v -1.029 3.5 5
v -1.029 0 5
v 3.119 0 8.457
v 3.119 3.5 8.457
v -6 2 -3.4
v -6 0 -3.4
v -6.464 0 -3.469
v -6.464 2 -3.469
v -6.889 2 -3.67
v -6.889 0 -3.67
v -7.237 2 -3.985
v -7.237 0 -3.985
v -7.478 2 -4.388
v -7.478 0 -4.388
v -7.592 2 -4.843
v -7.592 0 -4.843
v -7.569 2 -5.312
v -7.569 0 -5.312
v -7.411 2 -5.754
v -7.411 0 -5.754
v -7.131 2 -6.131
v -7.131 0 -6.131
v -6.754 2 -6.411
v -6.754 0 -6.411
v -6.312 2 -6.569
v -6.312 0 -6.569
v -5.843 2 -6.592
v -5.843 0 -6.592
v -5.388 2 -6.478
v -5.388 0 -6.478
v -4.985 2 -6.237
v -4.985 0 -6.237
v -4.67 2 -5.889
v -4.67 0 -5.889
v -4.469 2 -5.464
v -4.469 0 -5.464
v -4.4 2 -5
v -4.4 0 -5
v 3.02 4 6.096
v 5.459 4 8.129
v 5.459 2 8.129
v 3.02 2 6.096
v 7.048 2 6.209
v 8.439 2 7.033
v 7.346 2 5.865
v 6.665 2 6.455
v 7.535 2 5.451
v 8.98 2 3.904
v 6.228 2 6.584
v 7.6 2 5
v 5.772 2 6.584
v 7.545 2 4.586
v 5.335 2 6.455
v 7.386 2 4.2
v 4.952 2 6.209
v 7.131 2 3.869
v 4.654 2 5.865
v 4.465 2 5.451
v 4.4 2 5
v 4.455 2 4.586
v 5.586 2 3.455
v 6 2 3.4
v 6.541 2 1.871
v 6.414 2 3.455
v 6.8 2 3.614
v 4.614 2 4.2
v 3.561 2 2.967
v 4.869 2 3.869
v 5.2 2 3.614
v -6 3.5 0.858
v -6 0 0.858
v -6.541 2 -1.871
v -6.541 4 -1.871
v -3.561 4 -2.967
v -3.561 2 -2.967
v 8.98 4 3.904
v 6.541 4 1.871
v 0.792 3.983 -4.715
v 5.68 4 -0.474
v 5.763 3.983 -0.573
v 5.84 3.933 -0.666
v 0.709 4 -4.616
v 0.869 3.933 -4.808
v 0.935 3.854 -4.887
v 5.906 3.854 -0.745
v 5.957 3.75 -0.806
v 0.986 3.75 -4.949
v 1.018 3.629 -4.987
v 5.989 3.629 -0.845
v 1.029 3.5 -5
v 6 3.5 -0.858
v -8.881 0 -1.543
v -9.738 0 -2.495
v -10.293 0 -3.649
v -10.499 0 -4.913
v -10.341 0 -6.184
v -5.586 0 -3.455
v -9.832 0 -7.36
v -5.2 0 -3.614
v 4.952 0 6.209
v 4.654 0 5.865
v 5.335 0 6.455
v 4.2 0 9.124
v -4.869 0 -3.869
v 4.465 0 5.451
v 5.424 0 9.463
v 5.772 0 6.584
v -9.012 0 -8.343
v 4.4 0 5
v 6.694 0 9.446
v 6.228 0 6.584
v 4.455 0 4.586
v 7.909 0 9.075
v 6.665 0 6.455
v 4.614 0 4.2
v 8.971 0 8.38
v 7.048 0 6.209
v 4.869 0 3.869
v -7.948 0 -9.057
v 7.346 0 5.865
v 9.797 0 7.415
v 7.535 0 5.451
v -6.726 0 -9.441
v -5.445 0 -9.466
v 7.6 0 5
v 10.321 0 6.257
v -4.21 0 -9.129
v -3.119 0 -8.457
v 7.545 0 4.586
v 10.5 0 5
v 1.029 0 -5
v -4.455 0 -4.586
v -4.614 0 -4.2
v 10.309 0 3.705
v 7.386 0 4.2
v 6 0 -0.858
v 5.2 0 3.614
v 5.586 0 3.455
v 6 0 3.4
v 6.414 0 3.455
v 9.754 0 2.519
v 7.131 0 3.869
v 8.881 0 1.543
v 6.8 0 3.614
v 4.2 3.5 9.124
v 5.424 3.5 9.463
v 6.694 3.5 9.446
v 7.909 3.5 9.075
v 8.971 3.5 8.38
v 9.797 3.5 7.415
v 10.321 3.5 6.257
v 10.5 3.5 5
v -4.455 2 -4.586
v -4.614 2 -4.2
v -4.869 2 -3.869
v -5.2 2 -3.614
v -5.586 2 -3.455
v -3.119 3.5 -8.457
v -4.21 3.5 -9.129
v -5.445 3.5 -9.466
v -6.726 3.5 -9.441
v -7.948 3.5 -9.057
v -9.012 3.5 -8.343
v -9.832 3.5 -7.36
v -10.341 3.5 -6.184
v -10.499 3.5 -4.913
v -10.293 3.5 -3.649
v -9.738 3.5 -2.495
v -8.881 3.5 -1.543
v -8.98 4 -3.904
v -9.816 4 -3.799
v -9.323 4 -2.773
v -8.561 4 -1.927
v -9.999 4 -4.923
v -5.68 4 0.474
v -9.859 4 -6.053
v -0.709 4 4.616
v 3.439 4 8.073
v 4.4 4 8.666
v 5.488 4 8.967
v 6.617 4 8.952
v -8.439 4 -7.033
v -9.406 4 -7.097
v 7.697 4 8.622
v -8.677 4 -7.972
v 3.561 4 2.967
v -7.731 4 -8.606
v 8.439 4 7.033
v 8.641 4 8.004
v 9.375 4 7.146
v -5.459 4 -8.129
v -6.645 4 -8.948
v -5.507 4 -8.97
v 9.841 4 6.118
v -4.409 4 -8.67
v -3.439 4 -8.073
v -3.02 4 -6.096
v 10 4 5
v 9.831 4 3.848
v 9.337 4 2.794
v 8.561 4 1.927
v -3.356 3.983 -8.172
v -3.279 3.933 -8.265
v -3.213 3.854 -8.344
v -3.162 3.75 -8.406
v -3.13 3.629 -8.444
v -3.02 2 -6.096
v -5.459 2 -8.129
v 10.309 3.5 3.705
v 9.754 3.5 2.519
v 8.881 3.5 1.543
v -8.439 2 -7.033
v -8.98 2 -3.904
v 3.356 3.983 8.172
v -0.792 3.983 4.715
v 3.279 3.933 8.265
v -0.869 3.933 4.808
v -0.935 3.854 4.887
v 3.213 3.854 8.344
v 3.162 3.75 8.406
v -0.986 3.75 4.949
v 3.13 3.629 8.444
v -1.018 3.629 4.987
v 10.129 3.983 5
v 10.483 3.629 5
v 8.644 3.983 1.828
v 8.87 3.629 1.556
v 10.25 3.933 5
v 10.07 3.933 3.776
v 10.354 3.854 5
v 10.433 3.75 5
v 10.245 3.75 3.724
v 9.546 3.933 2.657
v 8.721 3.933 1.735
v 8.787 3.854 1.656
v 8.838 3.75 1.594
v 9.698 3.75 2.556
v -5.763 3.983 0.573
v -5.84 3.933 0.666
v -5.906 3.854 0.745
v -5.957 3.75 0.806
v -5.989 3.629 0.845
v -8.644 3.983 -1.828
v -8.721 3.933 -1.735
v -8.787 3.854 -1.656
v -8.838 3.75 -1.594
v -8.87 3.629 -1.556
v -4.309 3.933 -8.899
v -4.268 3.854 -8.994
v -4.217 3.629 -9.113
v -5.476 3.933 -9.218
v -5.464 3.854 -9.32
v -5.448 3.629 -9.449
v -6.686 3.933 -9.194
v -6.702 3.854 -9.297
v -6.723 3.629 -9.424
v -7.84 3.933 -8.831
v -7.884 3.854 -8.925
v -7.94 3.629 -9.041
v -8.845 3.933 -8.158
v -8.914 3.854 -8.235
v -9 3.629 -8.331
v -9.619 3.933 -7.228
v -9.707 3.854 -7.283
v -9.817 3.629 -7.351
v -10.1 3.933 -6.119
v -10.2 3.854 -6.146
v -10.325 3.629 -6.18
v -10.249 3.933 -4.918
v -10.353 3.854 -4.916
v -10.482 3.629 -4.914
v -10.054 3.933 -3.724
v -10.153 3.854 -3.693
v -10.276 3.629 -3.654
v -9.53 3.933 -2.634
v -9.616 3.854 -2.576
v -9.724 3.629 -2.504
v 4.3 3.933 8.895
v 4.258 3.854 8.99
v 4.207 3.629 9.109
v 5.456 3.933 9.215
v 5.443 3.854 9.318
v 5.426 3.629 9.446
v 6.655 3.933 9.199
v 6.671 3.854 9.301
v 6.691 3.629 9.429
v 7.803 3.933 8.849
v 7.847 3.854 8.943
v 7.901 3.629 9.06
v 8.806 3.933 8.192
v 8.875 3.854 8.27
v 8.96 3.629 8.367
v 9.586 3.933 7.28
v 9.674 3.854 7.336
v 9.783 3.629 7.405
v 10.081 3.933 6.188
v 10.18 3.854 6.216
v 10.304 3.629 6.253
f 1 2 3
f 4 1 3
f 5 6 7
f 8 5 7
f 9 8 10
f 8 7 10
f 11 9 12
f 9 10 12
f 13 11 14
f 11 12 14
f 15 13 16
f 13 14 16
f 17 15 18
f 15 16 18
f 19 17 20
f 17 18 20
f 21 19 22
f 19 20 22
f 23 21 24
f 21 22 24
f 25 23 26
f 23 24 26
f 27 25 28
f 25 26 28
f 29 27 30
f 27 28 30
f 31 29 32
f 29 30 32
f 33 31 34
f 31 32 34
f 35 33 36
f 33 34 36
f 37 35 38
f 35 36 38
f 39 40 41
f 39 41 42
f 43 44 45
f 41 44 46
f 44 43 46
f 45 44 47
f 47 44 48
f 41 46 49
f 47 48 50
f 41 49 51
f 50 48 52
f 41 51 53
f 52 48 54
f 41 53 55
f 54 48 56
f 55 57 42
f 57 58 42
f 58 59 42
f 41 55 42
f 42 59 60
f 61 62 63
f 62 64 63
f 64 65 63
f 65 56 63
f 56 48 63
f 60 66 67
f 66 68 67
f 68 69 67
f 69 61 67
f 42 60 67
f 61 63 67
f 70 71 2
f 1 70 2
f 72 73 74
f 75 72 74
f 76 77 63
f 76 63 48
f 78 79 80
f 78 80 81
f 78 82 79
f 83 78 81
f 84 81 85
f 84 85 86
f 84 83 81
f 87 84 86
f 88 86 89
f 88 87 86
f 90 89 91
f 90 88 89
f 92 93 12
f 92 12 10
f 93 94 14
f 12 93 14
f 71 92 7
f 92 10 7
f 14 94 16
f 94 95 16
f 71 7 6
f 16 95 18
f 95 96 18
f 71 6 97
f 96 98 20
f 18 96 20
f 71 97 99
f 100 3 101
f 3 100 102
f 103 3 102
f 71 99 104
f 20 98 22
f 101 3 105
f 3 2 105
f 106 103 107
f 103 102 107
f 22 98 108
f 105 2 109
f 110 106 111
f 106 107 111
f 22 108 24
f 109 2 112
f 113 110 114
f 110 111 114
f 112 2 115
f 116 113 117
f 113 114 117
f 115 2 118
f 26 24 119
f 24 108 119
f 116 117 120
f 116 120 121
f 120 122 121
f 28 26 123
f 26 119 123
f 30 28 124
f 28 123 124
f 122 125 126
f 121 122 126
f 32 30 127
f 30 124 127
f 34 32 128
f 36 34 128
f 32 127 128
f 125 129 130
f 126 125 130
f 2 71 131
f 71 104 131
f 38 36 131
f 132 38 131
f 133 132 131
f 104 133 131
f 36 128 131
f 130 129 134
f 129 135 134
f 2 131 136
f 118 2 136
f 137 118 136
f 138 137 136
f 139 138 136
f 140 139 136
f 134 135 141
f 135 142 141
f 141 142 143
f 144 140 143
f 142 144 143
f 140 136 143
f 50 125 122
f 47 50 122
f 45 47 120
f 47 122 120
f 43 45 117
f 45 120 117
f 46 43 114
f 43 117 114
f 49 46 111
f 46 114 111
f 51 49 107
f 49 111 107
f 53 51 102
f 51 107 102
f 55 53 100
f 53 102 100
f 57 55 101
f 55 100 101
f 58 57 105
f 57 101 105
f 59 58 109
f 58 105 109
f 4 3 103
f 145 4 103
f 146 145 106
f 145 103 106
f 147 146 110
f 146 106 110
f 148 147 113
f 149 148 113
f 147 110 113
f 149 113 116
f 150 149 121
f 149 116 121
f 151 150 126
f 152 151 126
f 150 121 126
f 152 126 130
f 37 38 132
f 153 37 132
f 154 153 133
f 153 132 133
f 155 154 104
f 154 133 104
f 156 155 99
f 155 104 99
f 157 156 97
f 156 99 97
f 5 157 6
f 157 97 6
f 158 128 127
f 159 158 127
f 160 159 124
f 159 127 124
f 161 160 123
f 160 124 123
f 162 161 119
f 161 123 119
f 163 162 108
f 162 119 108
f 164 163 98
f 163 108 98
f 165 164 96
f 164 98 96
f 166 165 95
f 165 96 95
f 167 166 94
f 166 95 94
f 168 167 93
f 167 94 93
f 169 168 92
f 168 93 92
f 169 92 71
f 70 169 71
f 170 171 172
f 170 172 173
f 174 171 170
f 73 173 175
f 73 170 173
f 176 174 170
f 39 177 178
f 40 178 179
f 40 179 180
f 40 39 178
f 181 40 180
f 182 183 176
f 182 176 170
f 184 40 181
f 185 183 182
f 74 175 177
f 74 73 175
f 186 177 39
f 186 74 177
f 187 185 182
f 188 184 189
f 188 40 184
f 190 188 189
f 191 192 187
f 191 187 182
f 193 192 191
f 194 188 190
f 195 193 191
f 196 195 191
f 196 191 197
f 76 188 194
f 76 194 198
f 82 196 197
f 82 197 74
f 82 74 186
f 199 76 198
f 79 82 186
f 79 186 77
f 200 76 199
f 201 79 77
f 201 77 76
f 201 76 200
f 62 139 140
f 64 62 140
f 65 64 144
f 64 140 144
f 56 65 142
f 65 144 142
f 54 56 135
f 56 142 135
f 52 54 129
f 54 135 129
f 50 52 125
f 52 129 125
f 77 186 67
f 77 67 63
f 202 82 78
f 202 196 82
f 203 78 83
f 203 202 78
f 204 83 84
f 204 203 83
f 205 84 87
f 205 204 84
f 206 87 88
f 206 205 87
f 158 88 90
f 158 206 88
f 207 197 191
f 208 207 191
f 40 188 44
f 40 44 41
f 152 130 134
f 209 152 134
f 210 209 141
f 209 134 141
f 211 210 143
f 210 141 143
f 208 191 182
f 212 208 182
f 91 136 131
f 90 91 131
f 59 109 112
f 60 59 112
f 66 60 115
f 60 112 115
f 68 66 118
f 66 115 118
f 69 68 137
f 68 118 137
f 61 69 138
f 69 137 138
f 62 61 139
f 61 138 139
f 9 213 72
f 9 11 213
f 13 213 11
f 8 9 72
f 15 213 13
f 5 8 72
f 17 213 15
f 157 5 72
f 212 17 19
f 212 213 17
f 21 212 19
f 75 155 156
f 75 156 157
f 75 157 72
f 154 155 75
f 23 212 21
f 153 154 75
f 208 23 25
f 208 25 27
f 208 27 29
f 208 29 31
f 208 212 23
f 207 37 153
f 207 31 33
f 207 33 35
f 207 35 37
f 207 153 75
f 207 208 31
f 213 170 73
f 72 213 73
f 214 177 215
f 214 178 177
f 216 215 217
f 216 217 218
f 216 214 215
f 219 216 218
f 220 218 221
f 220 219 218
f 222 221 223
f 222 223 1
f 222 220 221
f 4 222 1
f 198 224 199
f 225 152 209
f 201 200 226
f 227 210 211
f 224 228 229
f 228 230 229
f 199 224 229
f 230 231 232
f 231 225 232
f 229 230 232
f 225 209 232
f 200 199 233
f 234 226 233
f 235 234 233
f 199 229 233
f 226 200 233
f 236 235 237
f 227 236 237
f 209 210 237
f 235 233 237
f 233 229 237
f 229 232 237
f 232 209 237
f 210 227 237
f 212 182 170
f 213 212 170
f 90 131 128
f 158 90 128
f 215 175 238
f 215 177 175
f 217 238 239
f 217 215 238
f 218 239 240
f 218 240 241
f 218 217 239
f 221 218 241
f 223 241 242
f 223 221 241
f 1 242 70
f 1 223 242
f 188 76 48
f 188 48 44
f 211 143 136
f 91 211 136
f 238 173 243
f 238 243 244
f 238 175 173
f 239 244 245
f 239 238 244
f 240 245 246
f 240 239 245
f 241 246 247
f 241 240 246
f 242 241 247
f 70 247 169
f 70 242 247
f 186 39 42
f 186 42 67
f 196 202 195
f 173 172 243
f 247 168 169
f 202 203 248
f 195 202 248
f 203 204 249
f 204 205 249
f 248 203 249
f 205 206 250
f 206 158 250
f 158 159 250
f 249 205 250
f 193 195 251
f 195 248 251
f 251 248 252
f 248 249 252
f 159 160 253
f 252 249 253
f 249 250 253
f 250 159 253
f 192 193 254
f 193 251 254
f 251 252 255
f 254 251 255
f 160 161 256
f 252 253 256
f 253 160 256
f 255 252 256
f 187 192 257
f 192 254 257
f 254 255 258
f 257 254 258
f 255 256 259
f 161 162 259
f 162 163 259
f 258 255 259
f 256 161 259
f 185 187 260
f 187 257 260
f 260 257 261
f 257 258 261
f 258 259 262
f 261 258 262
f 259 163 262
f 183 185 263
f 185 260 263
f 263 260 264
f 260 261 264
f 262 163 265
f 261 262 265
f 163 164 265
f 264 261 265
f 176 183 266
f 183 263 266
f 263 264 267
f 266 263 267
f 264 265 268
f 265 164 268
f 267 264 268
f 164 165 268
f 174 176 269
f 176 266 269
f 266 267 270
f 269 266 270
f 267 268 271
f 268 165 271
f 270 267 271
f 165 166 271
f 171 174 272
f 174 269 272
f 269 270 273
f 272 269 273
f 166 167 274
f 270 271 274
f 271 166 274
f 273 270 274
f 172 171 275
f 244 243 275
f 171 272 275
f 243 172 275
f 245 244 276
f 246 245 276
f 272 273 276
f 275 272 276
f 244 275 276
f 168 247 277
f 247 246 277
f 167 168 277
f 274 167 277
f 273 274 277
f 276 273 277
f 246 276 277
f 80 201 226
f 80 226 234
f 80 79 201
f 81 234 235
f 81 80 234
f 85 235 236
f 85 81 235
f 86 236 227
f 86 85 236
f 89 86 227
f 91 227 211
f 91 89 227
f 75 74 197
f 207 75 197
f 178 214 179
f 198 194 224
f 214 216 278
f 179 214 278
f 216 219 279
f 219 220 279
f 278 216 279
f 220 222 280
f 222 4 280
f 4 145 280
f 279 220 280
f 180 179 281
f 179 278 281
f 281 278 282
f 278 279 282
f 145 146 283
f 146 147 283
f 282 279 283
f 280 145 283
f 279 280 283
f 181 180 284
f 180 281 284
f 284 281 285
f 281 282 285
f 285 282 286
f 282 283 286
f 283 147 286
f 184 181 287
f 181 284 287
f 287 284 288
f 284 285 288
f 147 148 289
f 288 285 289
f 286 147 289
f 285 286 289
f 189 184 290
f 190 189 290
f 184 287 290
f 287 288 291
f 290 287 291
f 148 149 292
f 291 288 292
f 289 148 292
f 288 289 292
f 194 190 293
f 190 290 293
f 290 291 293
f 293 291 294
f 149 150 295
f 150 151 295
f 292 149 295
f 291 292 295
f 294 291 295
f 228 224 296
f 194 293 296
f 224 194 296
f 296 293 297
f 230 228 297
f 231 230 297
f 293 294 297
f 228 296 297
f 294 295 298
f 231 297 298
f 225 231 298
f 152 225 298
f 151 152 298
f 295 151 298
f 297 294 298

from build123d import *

# Parameters (mm, degrees)
BOSS_EXTRUDE1_DEPTH = 4
CUT_EXTRUDE1_DEPTH  = 2
FILLET1_R           = 0.5


with BuildPart() as part:
    # Sketch1 → Boss-Extrude1 (new body)
    with BuildSketch(Plane(origin=(0, 0, 0), x_dir=(1, 0, 0), z_dir=(0, 1, 0))):
        with BuildLine():
            ThreePointArc((-3.119170202, 8.456995758), (-9.456995758, 7.880829798), (-8.880829798, 1.543004242))
            ThreePointArc((-8.880829798, 1.543004242), (-7.531913687, 0.7687779), (-6, 0.5))
            Line((-6, 0.5), (-6, 3.4))
            ThreePointArc((-6, 3.4), (-7.13137085, 6.13137085), (-4.4, 5))
            Line((-4.4, 5), (-1.5, 5))
            ThreePointArc((-1.5, 5), (-1.924847604, 6.908699283), (-3.119170202, 8.456995758))
        make_face()
        with BuildLine():
            Line((-6, 3.4), (-6, 0.5))
            ThreePointArc((-6, 0.5), (-2.818019485, 1.818019485), (-1.5, 5))
            Line((-1.5, 5), (-4.4, 5))
            ThreePointArc((-4.4, 5), (-4.86862915, 3.86862915), (-6, 3.4))
        make_face()
        with BuildLine():
            Line((-6, 0.5), (-6, -0.857687257))
            Line((-6, -0.857687257), (-1.029224708, -5))
            Line((-1.029224708, -5), (1.5, -5))
            ThreePointArc((1.5, -5), (2.818019485, -1.818019485), (6, -0.5))
            Line((6, -0.5), (6, 0.857687257))
            Line((6, 0.857687257), (1.029224708, 5))
            Line((1.029224708, 5), (-1.5, 5))
            ThreePointArc((-1.5, 5), (-2.818019485, 1.818019485), (-6, 0.5))
        make_face()
        with BuildLine():
            ThreePointArc((1.5, -5), (1.924847604, -6.908699283), (3.119170202, -8.456995758))
            ThreePointArc((3.119170202, -8.456995758), (7.908699283, -9.075152396), (10.5, -5))
            ThreePointArc((10.5, -5), (10.075152396, -3.091300717), (8.880829798, -1.543004242))
            ThreePointArc((8.880829798, -1.543004242), (7.531913687, -0.7687779), (6, -0.5))
            Line((6, -0.5), (6, -3.4))
            ThreePointArc((6, -3.4), (7.13137085, -3.86862915), (7.6, -5))
            ThreePointArc((7.6, -5), (6, -6.6), (4.4, -5))
            Line((4.4, -5), (1.5, -5))
        make_face()
        with BuildLine():
            ThreePointArc((6, -0.5), (2.818019485, -1.818019485), (1.5, -5))
            Line((1.5, -5), (4.4, -5))
            ThreePointArc((4.4, -5), (4.86862915, -3.86862915), (6, -3.4))
            Line((6, -3.4), (6, -0.5))
        make_face()
        with BuildLine():
            Line((1.5, -5), (-1.029224708, -5))
            Line((-1.029224708, -5), (3.119170202, -8.456995758))
            ThreePointArc((3.119170202, -8.456995758), (1.924847604, -6.908699283), (1.5, -5))
        make_face()
        with BuildLine():
            ThreePointArc((-6, 0.5), (-7.531913687, 0.7687779), (-8.880829798, 1.543004242))
            Line((-8.880829798, 1.543004242), (-6, -0.857687257))
            Line((-6, -0.857687257), (-6, 0.5))
        make_face()
        with BuildLine():
            Line((8.880829798, -1.543004242), (6, 0.857687257))
            Line((6, 0.857687257), (6, -0.5))
            ThreePointArc((6, -0.5), (7.531913687, -0.7687779), (8.880829798, -1.543004242))
        make_face()
        with BuildLine():
            Line((1.029224708, 5), (-3.119170202, 8.456995758))
            ThreePointArc((-3.119170202, 8.456995758), (-1.924847604, 6.908699283), (-1.5, 5))
            Line((-1.5, 5), (1.029224708, 5))
        make_face()
    extrude(amount=BOSS_EXTRUDE1_DEPTH)

    # Sketch2 → Cut-Extrude1 (cut)
    with BuildSketch(Plane(origin=(0, 4, 0), x_dir=(1, 0, 0), z_dir=(0, 1, 0))):
        Polygon((-8.439430194, 7.032858495), (-8.980222196, 3.903820729), (-6.540792002, 1.870962234), (-3.560569806, 2.967141505), (-3.019777804, 6.096179271), (-5.459207998, 8.129037766), align=None)
        Polygon((5.459207998, -8.129037766), (3.019777804, -6.096179271), (3.560569806, -2.967141505), (6.540792002, -1.870962234), (8.980222196, -3.903820729), (8.439430194, -7.032858495), align=None)
    extrude(amount=-CUT_EXTRUDE1_DEPTH, mode=Mode.SUBTRACT)

    # Fillet1
    fillet1_edges = [part.edges().sort_by_distance(p)[0] for p in [
        (-2.880829798, 4, 3.456995758),
        (9.456995758, 4, 7.880829798),
        (2.880829798, 4, -3.456995758),
        (-9.456995758, 4, -7.880829798),
    ]]
    fillet(fillet1_edges, radius=FILLET1_R)


solid = part.part
